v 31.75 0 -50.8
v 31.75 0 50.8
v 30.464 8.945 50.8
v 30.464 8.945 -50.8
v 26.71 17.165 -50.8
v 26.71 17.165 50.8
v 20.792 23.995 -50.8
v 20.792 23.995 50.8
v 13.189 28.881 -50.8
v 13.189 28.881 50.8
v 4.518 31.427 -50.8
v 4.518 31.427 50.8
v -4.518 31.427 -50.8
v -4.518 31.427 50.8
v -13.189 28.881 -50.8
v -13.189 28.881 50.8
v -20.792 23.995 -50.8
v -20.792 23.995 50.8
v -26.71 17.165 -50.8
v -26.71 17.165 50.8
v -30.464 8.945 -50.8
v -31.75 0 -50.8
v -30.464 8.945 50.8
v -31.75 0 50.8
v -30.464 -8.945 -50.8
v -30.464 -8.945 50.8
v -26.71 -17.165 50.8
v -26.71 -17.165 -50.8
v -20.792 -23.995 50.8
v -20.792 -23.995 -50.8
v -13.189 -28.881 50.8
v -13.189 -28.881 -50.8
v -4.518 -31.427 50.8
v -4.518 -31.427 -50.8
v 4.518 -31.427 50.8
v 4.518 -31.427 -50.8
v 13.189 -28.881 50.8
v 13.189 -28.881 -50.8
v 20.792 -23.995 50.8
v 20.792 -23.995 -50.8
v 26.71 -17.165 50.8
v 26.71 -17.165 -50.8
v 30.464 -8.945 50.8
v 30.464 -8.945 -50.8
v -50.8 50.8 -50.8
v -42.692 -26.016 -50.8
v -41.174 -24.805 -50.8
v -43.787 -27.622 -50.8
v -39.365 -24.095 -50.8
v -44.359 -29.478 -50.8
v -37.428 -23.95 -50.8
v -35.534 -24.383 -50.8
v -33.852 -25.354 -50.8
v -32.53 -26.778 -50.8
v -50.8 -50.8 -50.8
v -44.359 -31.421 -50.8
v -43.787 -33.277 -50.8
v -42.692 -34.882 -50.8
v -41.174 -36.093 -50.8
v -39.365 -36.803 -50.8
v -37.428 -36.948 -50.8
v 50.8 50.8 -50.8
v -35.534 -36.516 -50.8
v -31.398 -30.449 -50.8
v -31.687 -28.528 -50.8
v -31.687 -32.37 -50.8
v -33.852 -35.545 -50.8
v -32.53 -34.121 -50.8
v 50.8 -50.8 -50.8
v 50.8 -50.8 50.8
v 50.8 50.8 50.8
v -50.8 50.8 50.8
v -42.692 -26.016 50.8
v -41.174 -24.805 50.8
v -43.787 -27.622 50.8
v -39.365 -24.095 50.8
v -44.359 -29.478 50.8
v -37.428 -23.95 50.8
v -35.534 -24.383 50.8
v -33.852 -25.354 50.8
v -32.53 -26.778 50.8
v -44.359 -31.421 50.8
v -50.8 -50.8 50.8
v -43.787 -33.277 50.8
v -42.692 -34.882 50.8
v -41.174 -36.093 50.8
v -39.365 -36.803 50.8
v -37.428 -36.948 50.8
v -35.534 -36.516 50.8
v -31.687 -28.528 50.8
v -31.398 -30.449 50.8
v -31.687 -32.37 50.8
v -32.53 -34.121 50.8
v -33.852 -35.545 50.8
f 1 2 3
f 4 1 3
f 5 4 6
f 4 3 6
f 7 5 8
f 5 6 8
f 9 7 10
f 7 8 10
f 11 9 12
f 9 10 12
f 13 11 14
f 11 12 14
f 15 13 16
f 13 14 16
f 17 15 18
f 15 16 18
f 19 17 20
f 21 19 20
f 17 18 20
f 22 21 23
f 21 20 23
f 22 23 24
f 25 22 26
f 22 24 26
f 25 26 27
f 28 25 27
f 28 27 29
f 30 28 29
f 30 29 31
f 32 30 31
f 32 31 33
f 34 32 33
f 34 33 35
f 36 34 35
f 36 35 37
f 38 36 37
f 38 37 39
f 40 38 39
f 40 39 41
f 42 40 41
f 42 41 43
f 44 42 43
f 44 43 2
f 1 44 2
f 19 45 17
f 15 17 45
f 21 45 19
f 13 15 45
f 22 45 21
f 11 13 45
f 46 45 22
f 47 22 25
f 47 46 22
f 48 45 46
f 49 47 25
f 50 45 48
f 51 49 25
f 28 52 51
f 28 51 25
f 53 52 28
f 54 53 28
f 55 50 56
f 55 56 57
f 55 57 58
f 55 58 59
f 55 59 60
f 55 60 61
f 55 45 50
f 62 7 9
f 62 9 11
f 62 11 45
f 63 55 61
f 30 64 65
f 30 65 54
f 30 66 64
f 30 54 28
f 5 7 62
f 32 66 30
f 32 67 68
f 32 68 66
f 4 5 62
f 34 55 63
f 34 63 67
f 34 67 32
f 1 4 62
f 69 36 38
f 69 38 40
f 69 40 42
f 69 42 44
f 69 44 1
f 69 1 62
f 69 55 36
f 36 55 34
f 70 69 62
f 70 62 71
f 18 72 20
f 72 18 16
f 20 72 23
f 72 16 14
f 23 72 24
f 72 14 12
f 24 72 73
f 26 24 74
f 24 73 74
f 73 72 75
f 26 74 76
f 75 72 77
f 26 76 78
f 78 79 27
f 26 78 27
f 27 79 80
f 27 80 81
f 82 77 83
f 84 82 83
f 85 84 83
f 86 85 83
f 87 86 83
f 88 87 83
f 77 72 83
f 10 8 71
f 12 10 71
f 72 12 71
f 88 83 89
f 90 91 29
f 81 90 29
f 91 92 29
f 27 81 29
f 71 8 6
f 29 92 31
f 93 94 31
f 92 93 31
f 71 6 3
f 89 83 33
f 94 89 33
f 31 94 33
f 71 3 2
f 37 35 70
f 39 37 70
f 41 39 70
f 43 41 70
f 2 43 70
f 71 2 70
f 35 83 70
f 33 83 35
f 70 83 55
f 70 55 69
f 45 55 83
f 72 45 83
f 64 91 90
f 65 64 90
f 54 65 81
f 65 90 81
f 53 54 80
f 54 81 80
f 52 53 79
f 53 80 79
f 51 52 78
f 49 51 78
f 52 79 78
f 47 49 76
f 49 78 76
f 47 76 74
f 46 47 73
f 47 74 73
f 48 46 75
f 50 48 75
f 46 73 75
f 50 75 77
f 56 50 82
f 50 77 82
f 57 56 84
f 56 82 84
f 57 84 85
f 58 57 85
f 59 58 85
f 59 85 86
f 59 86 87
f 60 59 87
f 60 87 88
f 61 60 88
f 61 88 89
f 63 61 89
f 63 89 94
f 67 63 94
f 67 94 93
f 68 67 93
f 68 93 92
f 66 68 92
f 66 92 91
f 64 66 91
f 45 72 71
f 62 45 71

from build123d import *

# Parameters (mm, degrees)
F0_W     = 101.6
F0_H     = 101.6
F1_DEPTH = 50.8
F2_R     = 31.75
F3_DEPTH = 101.601
F4_R     = 6.517177
F5_DEPTH = 101.601


with BuildPart() as f1:
    # F0 (on Front) → F1 (new body, symmetric)
    with BuildSketch(Plane.XZ):
        Rectangle(F0_W, F0_H)
    extrude(amount=F1_DEPTH, both=True)

    # F2 (on face) → F3 (cut, through all)
    with BuildSketch(Plane.XY.offset(50.8)):
        Circle(F2_R)
    extrude(amount=-F3_DEPTH, mode=Mode.SUBTRACT)

    # F4 (on face) → F5 (cut, through all)
    with BuildSketch(Plane.XY.offset(50.8)):
        with Locations((-37.914988, -30.449271)):
            Circle(F4_R)
    extrude(amount=-F5_DEPTH, mode=Mode.SUBTRACT)


solid = f1.part
